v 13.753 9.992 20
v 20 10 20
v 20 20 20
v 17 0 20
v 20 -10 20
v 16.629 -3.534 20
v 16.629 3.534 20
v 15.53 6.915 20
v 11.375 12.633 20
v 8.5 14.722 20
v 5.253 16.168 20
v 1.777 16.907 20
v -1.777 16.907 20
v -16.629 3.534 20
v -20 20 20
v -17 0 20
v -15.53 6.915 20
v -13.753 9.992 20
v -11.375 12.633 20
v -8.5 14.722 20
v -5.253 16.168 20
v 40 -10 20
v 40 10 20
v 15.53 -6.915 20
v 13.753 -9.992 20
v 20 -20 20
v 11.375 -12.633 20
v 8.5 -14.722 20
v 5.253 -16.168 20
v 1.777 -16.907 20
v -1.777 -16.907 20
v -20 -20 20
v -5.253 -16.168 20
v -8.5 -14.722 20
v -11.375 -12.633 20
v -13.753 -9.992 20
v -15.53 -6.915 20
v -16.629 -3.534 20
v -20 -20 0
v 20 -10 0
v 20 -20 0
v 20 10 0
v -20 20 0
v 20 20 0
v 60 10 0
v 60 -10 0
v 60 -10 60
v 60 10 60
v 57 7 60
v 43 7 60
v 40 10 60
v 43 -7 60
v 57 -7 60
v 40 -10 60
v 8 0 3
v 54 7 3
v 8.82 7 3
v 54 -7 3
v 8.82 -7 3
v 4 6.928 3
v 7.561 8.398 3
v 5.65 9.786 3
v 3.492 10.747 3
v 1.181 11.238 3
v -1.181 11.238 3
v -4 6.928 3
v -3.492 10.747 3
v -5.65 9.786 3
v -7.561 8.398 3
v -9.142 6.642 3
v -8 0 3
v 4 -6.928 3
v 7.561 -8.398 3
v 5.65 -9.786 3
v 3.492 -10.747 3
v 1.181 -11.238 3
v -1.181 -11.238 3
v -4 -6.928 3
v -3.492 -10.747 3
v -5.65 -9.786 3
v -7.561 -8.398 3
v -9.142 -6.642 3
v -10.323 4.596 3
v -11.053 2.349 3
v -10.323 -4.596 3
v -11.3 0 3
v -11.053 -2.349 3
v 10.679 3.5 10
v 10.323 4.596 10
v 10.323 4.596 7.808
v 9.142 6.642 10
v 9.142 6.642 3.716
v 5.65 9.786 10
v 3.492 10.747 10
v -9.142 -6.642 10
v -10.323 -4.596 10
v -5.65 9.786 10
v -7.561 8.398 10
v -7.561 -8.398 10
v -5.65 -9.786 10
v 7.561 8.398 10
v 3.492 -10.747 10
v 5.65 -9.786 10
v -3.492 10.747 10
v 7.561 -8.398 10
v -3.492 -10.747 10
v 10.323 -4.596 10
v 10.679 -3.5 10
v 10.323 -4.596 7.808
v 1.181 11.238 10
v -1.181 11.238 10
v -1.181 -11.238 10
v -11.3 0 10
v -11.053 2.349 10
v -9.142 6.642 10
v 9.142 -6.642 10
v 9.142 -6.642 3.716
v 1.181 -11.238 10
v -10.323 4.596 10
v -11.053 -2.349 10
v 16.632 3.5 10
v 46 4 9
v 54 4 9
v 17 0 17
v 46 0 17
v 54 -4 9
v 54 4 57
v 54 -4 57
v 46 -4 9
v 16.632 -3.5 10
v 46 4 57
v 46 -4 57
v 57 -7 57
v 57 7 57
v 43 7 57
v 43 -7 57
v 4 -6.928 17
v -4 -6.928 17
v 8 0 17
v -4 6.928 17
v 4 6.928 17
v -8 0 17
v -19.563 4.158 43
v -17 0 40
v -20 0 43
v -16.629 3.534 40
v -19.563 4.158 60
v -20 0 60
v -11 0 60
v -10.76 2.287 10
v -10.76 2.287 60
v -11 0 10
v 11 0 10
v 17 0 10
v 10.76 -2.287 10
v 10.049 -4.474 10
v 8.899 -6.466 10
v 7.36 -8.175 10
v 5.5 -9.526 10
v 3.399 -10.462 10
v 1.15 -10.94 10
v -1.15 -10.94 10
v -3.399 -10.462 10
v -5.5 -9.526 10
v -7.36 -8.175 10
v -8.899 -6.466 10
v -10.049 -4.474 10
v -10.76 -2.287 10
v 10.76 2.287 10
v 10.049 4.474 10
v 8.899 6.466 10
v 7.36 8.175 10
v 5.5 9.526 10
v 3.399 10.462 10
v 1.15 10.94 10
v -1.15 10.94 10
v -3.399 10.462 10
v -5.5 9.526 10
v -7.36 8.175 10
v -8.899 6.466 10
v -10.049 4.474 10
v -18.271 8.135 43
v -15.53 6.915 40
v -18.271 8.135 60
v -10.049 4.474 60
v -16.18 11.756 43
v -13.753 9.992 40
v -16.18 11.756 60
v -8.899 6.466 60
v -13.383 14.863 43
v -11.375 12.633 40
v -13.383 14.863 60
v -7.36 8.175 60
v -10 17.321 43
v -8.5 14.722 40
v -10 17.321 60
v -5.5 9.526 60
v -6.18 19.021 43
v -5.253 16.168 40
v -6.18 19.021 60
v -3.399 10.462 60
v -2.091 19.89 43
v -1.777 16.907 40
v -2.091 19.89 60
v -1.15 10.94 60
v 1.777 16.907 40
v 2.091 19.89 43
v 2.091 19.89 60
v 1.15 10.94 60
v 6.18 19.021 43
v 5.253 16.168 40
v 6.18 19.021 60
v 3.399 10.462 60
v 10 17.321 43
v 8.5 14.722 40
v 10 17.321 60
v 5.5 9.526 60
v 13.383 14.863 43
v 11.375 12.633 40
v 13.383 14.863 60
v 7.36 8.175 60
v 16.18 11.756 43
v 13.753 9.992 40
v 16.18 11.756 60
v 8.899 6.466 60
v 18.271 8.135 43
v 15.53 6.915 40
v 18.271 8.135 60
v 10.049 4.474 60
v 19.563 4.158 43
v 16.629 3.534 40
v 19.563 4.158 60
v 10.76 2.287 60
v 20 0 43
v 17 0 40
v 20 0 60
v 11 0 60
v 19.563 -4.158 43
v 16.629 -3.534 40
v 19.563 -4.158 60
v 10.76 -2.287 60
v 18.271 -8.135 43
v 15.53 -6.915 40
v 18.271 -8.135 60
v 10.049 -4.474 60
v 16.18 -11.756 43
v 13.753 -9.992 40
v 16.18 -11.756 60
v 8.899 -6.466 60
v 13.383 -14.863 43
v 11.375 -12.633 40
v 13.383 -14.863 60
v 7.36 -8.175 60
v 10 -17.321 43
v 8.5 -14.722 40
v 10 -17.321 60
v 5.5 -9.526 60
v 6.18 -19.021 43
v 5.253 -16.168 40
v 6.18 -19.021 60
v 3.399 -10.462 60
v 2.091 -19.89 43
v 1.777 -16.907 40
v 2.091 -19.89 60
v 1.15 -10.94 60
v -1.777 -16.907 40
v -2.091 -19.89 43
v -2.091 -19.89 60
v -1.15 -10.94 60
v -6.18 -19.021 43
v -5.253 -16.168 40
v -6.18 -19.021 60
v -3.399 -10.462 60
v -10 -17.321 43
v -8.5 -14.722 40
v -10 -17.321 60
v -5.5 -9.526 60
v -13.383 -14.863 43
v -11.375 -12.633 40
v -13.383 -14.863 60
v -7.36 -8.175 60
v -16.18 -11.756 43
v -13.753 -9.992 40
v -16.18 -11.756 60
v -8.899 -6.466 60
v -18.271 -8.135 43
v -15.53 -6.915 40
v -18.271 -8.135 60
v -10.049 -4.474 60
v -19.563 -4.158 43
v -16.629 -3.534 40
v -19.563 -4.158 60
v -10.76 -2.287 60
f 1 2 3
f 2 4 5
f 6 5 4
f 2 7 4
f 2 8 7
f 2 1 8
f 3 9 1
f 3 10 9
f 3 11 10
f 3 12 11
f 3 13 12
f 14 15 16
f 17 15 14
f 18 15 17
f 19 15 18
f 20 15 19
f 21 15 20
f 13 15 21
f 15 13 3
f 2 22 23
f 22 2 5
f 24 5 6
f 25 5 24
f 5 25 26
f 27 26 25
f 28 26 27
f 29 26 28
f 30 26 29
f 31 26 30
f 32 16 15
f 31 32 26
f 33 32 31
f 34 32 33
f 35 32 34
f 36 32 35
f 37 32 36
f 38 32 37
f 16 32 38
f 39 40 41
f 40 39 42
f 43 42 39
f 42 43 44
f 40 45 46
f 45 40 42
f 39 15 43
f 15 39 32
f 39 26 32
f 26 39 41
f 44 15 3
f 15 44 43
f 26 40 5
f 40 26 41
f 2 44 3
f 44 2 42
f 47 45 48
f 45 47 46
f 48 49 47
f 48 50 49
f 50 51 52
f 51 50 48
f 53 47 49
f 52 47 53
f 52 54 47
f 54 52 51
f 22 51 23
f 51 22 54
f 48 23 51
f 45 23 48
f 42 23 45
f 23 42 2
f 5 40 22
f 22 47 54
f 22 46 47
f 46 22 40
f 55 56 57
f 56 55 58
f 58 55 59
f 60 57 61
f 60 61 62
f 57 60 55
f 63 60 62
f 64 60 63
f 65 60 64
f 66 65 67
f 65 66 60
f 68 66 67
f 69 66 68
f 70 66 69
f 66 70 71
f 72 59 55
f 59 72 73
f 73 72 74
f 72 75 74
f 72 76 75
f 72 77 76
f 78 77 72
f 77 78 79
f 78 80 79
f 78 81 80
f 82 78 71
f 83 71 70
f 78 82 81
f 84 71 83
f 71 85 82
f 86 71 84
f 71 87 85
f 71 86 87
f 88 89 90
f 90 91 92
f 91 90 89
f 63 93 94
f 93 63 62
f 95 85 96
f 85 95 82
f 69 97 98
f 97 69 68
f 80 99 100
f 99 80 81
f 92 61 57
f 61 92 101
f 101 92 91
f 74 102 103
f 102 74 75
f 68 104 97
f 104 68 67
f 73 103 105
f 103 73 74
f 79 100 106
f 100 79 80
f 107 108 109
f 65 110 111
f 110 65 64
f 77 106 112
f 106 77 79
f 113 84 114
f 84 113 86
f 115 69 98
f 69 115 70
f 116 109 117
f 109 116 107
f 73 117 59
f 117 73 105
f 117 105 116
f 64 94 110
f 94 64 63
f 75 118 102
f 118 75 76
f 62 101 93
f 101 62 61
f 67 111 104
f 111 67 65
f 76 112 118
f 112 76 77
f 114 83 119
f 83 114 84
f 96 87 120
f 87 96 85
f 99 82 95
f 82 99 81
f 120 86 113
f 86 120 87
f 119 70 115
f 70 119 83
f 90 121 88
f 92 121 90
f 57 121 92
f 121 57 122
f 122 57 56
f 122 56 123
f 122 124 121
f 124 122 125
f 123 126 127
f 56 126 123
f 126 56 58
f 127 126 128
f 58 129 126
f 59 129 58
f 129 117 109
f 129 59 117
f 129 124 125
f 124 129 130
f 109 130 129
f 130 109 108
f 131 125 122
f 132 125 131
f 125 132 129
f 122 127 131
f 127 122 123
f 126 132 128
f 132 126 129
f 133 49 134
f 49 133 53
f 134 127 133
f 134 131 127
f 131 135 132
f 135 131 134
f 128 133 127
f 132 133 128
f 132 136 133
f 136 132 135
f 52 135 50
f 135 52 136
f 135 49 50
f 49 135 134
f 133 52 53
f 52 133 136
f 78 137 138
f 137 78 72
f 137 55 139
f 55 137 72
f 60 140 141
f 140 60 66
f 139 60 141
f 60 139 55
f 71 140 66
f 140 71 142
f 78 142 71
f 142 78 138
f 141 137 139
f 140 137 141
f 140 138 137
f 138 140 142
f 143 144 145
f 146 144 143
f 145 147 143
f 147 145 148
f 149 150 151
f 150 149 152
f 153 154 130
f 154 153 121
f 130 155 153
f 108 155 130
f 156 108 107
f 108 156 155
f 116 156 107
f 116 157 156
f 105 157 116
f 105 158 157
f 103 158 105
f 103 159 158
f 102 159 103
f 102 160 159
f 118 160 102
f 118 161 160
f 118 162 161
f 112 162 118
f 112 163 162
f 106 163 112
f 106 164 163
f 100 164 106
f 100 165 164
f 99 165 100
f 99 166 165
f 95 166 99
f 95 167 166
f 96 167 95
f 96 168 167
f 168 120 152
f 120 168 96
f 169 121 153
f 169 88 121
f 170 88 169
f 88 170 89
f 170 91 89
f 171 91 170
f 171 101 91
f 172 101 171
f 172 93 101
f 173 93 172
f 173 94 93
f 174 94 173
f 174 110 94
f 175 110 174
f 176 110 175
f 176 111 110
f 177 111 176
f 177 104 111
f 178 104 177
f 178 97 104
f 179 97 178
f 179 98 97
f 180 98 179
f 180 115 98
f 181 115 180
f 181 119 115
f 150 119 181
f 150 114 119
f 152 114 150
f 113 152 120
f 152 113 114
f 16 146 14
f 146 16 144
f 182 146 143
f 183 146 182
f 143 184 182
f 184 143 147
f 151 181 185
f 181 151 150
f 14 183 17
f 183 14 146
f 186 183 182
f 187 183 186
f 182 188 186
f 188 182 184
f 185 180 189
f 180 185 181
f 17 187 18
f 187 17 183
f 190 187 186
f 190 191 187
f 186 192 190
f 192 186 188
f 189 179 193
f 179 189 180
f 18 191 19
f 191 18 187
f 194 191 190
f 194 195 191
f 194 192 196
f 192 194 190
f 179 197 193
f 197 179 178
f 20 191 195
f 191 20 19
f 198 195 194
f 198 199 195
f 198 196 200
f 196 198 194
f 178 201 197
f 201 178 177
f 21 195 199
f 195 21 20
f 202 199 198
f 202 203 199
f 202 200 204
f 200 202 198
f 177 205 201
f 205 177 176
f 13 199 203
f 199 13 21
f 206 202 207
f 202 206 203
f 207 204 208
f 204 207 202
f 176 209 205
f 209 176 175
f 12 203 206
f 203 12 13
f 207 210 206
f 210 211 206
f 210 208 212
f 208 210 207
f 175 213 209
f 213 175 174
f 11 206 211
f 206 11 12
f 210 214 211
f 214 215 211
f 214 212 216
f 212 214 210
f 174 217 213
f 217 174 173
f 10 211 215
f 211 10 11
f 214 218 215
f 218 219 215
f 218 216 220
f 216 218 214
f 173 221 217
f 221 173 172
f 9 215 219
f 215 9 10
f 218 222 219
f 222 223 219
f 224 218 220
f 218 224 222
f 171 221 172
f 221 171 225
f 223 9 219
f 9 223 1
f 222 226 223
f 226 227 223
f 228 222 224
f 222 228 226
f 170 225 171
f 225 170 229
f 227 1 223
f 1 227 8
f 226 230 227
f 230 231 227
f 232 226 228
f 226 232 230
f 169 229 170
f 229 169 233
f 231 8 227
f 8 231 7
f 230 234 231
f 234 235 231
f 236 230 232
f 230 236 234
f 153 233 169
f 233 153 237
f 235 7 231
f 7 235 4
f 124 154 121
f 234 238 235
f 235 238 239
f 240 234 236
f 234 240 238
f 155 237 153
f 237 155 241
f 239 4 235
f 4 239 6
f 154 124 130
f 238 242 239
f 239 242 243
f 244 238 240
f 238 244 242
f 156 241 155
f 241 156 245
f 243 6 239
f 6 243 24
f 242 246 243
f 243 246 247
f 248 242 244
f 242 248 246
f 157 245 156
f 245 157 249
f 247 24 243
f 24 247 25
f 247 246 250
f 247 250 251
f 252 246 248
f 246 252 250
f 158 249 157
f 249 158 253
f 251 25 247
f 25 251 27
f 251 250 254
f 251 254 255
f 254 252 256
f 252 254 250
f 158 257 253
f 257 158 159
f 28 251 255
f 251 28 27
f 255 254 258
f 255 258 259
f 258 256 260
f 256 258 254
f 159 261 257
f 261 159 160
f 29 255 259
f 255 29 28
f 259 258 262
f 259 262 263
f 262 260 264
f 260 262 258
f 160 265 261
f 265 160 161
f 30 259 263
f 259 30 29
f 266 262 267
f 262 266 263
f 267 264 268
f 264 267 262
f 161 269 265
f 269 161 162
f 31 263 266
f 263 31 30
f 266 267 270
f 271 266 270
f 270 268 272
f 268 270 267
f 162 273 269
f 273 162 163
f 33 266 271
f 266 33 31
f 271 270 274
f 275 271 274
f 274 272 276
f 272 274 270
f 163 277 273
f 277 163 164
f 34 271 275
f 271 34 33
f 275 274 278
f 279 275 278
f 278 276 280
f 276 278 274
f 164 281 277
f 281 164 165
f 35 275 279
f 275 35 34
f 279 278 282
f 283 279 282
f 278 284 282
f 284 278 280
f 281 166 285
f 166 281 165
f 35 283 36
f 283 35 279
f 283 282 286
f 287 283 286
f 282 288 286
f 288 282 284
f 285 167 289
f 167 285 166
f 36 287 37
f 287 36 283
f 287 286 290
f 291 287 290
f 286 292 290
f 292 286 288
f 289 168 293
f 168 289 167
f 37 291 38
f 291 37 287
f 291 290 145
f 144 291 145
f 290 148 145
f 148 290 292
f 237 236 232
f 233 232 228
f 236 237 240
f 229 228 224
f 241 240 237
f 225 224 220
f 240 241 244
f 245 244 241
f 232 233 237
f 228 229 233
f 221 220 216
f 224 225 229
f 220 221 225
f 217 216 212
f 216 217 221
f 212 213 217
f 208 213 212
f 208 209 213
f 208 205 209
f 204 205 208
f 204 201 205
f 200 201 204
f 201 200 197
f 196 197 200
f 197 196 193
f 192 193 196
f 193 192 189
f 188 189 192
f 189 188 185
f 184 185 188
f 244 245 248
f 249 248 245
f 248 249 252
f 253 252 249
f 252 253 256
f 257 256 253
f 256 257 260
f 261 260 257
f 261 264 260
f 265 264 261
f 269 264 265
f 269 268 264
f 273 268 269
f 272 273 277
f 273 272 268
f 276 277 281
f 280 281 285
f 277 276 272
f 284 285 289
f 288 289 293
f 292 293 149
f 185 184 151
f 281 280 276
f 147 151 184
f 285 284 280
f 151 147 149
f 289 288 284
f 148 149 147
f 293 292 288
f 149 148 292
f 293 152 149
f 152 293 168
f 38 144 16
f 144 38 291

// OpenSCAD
pipeDiameter = 42;
wallThickness=3;
size = 2;
assembly(wallThickness);

$fn = 30;
$model = 0;

module assembly(_thickness) {
    
    // Scaling Calculation to determine block size as a function of the desired pipe diameter
    block_size = ceil((pipeDiameter / 6 + _thickness) * 2);
    
    pipe_radius = (block_size * size)/2;
    pipe_inner = pipe_radius-3*_thickness;
    
    if($model == -1) {
        projection(cut=true)
        {
            rotate([90,0,0]) 
            {
                union() {
                    model();
                    pipe();
                }
            }
        }
    }
    else if ($model == 0)
    {
        union() {
            model();
            pipe();
        }    
    }
    else if ($model == 1)
    {
        difference() {
            model();
            pipe();
        }
    }
    
    else if ($model == 2)
    {
        pipe();
    }
    
    else if ($model == 3)
    {
        lid();
    }
    
    module stand() {
        
        color("orange")
        translate([0,0,_thickness]) {
            cylinder(r=pipe_inner-_thickness, h = block_size-2*_thickness, $fn = 6);
        }
    }

    module water_way() {
        
        translate([0,0,_thickness]) {
            union() {
                // Pipe cutout
                cylinder(r=pipe_inner+0.3, h = block_size-_thickness);
                
                // Channel
                rotate([-90,0,-90]) {
                    linear_extrude(height = (2 + (size/2))*block_size-2*_thickness) {
                        base = (block_size-2*_thickness);
                        polygon(points=[
                            [-base/2, 0],
                            [0, -base],
                            [base/2, 0]
                        ]);
                    }
                }
                
                // Tower Cutout
                translate([(size-(size-2)*0.5)*block_size + 2*_thickness,-(block_size-4*_thickness)/2,0]) {
                    cube([block_size-4*_thickness, block_size-4*_thickness, 3*block_size-1*_thickness]);
                }
                
                translate([(size-(size-2)*0.5)*block_size + 1*_thickness,-(block_size-2*_thickness)/2,-2*_thickness+3*block_size]) {
                    lid_blank();
                }
            }
        }
    }
    
    module lid_blank() {
        
        cube([block_size-2*_thickness, block_size-2*_thickness, _thickness]);
    }
    
    module lid() {
        color("yellow")
        difference() {
            lid_blank();
            translate([(block_size-2*_thickness)/2, (block_size-2*_thickness)/2, 0]) {
                cube([_thickness*2, _thickness*2, _thickness*2], center=true);
            }
        }
    }


    module model() {
        
        union() {
            difference() {
                platform();
                //pipe();
                water_way();
            }
            
            stand();
        }

        module platform() {
            
            translate([block_size*(size-(size-2)*0.5), -block_size/2, 0]) {
                union() {
                    translate([0,0,block_size*2]) {
                        question_block();
                    }

                    translate([0,0,block_size*1]) {
                        brick_block();
                    }

                    translate([0,0,0]) {
                        ground_block();
                    }

                    // Joiner
                    translate([-block_size,0,0]) {
                        ground_block();
                    }
                    
                    
                    
                    // Pipe Platform
                    delta = (size-1)/2;
                    translate([-block_size*(size-((size-3)*0.5)),0,0]) {
                        union() {
                            for(ix = [-delta:1:delta]) {
                                for(iy = [-delta:1:delta]) {                        
                                    translate([ix*block_size,iy*block_size,0])
                                        ground_block();
                                }
                            }
                        }
                    }
                }
            }
        }
    }


    module pipe() {
            color("green")
            rotate_extrude(angle=360) {
                
                rotate([0,0,0]) {
                    polygon(points=[
                        [pipe_inner,block_size/2],
                        [pipe_radius-_thickness,block_size/2],
                        [pipe_radius-_thickness,(2*block_size)],
                        [pipe_radius,(2*block_size) + _thickness],
                        [pipe_radius,(3*block_size)],
                        [pipe_inner,(3*block_size)]
                    ]);
                }
            }
        }


    module question_block() { color("yellow") block_template("question.dat");   }
    module brick_block()    { color("red") block_template("bricks.dat");     }
    module ground_block()   { color("orange") block_template("ground.dat");     }


    module block_template(texture_file) {
        scale(block_size/20) {
            union() {
                cube(20);

                translate([20,0,20])
                rotate([90,-180,0])
                surface(file = texture_file, center=false);
                
                translate([20,20,20])
                rotate([90,180,90])
                surface(file = texture_file, center=false);
                
                translate([0,20,20])
                rotate([90,180,180])
                surface(file = texture_file, center=false);

                translate([0,0,20])
                rotate([90,180,-90])
                surface(file = texture_file, center=false);
            }
        }
    }
}
